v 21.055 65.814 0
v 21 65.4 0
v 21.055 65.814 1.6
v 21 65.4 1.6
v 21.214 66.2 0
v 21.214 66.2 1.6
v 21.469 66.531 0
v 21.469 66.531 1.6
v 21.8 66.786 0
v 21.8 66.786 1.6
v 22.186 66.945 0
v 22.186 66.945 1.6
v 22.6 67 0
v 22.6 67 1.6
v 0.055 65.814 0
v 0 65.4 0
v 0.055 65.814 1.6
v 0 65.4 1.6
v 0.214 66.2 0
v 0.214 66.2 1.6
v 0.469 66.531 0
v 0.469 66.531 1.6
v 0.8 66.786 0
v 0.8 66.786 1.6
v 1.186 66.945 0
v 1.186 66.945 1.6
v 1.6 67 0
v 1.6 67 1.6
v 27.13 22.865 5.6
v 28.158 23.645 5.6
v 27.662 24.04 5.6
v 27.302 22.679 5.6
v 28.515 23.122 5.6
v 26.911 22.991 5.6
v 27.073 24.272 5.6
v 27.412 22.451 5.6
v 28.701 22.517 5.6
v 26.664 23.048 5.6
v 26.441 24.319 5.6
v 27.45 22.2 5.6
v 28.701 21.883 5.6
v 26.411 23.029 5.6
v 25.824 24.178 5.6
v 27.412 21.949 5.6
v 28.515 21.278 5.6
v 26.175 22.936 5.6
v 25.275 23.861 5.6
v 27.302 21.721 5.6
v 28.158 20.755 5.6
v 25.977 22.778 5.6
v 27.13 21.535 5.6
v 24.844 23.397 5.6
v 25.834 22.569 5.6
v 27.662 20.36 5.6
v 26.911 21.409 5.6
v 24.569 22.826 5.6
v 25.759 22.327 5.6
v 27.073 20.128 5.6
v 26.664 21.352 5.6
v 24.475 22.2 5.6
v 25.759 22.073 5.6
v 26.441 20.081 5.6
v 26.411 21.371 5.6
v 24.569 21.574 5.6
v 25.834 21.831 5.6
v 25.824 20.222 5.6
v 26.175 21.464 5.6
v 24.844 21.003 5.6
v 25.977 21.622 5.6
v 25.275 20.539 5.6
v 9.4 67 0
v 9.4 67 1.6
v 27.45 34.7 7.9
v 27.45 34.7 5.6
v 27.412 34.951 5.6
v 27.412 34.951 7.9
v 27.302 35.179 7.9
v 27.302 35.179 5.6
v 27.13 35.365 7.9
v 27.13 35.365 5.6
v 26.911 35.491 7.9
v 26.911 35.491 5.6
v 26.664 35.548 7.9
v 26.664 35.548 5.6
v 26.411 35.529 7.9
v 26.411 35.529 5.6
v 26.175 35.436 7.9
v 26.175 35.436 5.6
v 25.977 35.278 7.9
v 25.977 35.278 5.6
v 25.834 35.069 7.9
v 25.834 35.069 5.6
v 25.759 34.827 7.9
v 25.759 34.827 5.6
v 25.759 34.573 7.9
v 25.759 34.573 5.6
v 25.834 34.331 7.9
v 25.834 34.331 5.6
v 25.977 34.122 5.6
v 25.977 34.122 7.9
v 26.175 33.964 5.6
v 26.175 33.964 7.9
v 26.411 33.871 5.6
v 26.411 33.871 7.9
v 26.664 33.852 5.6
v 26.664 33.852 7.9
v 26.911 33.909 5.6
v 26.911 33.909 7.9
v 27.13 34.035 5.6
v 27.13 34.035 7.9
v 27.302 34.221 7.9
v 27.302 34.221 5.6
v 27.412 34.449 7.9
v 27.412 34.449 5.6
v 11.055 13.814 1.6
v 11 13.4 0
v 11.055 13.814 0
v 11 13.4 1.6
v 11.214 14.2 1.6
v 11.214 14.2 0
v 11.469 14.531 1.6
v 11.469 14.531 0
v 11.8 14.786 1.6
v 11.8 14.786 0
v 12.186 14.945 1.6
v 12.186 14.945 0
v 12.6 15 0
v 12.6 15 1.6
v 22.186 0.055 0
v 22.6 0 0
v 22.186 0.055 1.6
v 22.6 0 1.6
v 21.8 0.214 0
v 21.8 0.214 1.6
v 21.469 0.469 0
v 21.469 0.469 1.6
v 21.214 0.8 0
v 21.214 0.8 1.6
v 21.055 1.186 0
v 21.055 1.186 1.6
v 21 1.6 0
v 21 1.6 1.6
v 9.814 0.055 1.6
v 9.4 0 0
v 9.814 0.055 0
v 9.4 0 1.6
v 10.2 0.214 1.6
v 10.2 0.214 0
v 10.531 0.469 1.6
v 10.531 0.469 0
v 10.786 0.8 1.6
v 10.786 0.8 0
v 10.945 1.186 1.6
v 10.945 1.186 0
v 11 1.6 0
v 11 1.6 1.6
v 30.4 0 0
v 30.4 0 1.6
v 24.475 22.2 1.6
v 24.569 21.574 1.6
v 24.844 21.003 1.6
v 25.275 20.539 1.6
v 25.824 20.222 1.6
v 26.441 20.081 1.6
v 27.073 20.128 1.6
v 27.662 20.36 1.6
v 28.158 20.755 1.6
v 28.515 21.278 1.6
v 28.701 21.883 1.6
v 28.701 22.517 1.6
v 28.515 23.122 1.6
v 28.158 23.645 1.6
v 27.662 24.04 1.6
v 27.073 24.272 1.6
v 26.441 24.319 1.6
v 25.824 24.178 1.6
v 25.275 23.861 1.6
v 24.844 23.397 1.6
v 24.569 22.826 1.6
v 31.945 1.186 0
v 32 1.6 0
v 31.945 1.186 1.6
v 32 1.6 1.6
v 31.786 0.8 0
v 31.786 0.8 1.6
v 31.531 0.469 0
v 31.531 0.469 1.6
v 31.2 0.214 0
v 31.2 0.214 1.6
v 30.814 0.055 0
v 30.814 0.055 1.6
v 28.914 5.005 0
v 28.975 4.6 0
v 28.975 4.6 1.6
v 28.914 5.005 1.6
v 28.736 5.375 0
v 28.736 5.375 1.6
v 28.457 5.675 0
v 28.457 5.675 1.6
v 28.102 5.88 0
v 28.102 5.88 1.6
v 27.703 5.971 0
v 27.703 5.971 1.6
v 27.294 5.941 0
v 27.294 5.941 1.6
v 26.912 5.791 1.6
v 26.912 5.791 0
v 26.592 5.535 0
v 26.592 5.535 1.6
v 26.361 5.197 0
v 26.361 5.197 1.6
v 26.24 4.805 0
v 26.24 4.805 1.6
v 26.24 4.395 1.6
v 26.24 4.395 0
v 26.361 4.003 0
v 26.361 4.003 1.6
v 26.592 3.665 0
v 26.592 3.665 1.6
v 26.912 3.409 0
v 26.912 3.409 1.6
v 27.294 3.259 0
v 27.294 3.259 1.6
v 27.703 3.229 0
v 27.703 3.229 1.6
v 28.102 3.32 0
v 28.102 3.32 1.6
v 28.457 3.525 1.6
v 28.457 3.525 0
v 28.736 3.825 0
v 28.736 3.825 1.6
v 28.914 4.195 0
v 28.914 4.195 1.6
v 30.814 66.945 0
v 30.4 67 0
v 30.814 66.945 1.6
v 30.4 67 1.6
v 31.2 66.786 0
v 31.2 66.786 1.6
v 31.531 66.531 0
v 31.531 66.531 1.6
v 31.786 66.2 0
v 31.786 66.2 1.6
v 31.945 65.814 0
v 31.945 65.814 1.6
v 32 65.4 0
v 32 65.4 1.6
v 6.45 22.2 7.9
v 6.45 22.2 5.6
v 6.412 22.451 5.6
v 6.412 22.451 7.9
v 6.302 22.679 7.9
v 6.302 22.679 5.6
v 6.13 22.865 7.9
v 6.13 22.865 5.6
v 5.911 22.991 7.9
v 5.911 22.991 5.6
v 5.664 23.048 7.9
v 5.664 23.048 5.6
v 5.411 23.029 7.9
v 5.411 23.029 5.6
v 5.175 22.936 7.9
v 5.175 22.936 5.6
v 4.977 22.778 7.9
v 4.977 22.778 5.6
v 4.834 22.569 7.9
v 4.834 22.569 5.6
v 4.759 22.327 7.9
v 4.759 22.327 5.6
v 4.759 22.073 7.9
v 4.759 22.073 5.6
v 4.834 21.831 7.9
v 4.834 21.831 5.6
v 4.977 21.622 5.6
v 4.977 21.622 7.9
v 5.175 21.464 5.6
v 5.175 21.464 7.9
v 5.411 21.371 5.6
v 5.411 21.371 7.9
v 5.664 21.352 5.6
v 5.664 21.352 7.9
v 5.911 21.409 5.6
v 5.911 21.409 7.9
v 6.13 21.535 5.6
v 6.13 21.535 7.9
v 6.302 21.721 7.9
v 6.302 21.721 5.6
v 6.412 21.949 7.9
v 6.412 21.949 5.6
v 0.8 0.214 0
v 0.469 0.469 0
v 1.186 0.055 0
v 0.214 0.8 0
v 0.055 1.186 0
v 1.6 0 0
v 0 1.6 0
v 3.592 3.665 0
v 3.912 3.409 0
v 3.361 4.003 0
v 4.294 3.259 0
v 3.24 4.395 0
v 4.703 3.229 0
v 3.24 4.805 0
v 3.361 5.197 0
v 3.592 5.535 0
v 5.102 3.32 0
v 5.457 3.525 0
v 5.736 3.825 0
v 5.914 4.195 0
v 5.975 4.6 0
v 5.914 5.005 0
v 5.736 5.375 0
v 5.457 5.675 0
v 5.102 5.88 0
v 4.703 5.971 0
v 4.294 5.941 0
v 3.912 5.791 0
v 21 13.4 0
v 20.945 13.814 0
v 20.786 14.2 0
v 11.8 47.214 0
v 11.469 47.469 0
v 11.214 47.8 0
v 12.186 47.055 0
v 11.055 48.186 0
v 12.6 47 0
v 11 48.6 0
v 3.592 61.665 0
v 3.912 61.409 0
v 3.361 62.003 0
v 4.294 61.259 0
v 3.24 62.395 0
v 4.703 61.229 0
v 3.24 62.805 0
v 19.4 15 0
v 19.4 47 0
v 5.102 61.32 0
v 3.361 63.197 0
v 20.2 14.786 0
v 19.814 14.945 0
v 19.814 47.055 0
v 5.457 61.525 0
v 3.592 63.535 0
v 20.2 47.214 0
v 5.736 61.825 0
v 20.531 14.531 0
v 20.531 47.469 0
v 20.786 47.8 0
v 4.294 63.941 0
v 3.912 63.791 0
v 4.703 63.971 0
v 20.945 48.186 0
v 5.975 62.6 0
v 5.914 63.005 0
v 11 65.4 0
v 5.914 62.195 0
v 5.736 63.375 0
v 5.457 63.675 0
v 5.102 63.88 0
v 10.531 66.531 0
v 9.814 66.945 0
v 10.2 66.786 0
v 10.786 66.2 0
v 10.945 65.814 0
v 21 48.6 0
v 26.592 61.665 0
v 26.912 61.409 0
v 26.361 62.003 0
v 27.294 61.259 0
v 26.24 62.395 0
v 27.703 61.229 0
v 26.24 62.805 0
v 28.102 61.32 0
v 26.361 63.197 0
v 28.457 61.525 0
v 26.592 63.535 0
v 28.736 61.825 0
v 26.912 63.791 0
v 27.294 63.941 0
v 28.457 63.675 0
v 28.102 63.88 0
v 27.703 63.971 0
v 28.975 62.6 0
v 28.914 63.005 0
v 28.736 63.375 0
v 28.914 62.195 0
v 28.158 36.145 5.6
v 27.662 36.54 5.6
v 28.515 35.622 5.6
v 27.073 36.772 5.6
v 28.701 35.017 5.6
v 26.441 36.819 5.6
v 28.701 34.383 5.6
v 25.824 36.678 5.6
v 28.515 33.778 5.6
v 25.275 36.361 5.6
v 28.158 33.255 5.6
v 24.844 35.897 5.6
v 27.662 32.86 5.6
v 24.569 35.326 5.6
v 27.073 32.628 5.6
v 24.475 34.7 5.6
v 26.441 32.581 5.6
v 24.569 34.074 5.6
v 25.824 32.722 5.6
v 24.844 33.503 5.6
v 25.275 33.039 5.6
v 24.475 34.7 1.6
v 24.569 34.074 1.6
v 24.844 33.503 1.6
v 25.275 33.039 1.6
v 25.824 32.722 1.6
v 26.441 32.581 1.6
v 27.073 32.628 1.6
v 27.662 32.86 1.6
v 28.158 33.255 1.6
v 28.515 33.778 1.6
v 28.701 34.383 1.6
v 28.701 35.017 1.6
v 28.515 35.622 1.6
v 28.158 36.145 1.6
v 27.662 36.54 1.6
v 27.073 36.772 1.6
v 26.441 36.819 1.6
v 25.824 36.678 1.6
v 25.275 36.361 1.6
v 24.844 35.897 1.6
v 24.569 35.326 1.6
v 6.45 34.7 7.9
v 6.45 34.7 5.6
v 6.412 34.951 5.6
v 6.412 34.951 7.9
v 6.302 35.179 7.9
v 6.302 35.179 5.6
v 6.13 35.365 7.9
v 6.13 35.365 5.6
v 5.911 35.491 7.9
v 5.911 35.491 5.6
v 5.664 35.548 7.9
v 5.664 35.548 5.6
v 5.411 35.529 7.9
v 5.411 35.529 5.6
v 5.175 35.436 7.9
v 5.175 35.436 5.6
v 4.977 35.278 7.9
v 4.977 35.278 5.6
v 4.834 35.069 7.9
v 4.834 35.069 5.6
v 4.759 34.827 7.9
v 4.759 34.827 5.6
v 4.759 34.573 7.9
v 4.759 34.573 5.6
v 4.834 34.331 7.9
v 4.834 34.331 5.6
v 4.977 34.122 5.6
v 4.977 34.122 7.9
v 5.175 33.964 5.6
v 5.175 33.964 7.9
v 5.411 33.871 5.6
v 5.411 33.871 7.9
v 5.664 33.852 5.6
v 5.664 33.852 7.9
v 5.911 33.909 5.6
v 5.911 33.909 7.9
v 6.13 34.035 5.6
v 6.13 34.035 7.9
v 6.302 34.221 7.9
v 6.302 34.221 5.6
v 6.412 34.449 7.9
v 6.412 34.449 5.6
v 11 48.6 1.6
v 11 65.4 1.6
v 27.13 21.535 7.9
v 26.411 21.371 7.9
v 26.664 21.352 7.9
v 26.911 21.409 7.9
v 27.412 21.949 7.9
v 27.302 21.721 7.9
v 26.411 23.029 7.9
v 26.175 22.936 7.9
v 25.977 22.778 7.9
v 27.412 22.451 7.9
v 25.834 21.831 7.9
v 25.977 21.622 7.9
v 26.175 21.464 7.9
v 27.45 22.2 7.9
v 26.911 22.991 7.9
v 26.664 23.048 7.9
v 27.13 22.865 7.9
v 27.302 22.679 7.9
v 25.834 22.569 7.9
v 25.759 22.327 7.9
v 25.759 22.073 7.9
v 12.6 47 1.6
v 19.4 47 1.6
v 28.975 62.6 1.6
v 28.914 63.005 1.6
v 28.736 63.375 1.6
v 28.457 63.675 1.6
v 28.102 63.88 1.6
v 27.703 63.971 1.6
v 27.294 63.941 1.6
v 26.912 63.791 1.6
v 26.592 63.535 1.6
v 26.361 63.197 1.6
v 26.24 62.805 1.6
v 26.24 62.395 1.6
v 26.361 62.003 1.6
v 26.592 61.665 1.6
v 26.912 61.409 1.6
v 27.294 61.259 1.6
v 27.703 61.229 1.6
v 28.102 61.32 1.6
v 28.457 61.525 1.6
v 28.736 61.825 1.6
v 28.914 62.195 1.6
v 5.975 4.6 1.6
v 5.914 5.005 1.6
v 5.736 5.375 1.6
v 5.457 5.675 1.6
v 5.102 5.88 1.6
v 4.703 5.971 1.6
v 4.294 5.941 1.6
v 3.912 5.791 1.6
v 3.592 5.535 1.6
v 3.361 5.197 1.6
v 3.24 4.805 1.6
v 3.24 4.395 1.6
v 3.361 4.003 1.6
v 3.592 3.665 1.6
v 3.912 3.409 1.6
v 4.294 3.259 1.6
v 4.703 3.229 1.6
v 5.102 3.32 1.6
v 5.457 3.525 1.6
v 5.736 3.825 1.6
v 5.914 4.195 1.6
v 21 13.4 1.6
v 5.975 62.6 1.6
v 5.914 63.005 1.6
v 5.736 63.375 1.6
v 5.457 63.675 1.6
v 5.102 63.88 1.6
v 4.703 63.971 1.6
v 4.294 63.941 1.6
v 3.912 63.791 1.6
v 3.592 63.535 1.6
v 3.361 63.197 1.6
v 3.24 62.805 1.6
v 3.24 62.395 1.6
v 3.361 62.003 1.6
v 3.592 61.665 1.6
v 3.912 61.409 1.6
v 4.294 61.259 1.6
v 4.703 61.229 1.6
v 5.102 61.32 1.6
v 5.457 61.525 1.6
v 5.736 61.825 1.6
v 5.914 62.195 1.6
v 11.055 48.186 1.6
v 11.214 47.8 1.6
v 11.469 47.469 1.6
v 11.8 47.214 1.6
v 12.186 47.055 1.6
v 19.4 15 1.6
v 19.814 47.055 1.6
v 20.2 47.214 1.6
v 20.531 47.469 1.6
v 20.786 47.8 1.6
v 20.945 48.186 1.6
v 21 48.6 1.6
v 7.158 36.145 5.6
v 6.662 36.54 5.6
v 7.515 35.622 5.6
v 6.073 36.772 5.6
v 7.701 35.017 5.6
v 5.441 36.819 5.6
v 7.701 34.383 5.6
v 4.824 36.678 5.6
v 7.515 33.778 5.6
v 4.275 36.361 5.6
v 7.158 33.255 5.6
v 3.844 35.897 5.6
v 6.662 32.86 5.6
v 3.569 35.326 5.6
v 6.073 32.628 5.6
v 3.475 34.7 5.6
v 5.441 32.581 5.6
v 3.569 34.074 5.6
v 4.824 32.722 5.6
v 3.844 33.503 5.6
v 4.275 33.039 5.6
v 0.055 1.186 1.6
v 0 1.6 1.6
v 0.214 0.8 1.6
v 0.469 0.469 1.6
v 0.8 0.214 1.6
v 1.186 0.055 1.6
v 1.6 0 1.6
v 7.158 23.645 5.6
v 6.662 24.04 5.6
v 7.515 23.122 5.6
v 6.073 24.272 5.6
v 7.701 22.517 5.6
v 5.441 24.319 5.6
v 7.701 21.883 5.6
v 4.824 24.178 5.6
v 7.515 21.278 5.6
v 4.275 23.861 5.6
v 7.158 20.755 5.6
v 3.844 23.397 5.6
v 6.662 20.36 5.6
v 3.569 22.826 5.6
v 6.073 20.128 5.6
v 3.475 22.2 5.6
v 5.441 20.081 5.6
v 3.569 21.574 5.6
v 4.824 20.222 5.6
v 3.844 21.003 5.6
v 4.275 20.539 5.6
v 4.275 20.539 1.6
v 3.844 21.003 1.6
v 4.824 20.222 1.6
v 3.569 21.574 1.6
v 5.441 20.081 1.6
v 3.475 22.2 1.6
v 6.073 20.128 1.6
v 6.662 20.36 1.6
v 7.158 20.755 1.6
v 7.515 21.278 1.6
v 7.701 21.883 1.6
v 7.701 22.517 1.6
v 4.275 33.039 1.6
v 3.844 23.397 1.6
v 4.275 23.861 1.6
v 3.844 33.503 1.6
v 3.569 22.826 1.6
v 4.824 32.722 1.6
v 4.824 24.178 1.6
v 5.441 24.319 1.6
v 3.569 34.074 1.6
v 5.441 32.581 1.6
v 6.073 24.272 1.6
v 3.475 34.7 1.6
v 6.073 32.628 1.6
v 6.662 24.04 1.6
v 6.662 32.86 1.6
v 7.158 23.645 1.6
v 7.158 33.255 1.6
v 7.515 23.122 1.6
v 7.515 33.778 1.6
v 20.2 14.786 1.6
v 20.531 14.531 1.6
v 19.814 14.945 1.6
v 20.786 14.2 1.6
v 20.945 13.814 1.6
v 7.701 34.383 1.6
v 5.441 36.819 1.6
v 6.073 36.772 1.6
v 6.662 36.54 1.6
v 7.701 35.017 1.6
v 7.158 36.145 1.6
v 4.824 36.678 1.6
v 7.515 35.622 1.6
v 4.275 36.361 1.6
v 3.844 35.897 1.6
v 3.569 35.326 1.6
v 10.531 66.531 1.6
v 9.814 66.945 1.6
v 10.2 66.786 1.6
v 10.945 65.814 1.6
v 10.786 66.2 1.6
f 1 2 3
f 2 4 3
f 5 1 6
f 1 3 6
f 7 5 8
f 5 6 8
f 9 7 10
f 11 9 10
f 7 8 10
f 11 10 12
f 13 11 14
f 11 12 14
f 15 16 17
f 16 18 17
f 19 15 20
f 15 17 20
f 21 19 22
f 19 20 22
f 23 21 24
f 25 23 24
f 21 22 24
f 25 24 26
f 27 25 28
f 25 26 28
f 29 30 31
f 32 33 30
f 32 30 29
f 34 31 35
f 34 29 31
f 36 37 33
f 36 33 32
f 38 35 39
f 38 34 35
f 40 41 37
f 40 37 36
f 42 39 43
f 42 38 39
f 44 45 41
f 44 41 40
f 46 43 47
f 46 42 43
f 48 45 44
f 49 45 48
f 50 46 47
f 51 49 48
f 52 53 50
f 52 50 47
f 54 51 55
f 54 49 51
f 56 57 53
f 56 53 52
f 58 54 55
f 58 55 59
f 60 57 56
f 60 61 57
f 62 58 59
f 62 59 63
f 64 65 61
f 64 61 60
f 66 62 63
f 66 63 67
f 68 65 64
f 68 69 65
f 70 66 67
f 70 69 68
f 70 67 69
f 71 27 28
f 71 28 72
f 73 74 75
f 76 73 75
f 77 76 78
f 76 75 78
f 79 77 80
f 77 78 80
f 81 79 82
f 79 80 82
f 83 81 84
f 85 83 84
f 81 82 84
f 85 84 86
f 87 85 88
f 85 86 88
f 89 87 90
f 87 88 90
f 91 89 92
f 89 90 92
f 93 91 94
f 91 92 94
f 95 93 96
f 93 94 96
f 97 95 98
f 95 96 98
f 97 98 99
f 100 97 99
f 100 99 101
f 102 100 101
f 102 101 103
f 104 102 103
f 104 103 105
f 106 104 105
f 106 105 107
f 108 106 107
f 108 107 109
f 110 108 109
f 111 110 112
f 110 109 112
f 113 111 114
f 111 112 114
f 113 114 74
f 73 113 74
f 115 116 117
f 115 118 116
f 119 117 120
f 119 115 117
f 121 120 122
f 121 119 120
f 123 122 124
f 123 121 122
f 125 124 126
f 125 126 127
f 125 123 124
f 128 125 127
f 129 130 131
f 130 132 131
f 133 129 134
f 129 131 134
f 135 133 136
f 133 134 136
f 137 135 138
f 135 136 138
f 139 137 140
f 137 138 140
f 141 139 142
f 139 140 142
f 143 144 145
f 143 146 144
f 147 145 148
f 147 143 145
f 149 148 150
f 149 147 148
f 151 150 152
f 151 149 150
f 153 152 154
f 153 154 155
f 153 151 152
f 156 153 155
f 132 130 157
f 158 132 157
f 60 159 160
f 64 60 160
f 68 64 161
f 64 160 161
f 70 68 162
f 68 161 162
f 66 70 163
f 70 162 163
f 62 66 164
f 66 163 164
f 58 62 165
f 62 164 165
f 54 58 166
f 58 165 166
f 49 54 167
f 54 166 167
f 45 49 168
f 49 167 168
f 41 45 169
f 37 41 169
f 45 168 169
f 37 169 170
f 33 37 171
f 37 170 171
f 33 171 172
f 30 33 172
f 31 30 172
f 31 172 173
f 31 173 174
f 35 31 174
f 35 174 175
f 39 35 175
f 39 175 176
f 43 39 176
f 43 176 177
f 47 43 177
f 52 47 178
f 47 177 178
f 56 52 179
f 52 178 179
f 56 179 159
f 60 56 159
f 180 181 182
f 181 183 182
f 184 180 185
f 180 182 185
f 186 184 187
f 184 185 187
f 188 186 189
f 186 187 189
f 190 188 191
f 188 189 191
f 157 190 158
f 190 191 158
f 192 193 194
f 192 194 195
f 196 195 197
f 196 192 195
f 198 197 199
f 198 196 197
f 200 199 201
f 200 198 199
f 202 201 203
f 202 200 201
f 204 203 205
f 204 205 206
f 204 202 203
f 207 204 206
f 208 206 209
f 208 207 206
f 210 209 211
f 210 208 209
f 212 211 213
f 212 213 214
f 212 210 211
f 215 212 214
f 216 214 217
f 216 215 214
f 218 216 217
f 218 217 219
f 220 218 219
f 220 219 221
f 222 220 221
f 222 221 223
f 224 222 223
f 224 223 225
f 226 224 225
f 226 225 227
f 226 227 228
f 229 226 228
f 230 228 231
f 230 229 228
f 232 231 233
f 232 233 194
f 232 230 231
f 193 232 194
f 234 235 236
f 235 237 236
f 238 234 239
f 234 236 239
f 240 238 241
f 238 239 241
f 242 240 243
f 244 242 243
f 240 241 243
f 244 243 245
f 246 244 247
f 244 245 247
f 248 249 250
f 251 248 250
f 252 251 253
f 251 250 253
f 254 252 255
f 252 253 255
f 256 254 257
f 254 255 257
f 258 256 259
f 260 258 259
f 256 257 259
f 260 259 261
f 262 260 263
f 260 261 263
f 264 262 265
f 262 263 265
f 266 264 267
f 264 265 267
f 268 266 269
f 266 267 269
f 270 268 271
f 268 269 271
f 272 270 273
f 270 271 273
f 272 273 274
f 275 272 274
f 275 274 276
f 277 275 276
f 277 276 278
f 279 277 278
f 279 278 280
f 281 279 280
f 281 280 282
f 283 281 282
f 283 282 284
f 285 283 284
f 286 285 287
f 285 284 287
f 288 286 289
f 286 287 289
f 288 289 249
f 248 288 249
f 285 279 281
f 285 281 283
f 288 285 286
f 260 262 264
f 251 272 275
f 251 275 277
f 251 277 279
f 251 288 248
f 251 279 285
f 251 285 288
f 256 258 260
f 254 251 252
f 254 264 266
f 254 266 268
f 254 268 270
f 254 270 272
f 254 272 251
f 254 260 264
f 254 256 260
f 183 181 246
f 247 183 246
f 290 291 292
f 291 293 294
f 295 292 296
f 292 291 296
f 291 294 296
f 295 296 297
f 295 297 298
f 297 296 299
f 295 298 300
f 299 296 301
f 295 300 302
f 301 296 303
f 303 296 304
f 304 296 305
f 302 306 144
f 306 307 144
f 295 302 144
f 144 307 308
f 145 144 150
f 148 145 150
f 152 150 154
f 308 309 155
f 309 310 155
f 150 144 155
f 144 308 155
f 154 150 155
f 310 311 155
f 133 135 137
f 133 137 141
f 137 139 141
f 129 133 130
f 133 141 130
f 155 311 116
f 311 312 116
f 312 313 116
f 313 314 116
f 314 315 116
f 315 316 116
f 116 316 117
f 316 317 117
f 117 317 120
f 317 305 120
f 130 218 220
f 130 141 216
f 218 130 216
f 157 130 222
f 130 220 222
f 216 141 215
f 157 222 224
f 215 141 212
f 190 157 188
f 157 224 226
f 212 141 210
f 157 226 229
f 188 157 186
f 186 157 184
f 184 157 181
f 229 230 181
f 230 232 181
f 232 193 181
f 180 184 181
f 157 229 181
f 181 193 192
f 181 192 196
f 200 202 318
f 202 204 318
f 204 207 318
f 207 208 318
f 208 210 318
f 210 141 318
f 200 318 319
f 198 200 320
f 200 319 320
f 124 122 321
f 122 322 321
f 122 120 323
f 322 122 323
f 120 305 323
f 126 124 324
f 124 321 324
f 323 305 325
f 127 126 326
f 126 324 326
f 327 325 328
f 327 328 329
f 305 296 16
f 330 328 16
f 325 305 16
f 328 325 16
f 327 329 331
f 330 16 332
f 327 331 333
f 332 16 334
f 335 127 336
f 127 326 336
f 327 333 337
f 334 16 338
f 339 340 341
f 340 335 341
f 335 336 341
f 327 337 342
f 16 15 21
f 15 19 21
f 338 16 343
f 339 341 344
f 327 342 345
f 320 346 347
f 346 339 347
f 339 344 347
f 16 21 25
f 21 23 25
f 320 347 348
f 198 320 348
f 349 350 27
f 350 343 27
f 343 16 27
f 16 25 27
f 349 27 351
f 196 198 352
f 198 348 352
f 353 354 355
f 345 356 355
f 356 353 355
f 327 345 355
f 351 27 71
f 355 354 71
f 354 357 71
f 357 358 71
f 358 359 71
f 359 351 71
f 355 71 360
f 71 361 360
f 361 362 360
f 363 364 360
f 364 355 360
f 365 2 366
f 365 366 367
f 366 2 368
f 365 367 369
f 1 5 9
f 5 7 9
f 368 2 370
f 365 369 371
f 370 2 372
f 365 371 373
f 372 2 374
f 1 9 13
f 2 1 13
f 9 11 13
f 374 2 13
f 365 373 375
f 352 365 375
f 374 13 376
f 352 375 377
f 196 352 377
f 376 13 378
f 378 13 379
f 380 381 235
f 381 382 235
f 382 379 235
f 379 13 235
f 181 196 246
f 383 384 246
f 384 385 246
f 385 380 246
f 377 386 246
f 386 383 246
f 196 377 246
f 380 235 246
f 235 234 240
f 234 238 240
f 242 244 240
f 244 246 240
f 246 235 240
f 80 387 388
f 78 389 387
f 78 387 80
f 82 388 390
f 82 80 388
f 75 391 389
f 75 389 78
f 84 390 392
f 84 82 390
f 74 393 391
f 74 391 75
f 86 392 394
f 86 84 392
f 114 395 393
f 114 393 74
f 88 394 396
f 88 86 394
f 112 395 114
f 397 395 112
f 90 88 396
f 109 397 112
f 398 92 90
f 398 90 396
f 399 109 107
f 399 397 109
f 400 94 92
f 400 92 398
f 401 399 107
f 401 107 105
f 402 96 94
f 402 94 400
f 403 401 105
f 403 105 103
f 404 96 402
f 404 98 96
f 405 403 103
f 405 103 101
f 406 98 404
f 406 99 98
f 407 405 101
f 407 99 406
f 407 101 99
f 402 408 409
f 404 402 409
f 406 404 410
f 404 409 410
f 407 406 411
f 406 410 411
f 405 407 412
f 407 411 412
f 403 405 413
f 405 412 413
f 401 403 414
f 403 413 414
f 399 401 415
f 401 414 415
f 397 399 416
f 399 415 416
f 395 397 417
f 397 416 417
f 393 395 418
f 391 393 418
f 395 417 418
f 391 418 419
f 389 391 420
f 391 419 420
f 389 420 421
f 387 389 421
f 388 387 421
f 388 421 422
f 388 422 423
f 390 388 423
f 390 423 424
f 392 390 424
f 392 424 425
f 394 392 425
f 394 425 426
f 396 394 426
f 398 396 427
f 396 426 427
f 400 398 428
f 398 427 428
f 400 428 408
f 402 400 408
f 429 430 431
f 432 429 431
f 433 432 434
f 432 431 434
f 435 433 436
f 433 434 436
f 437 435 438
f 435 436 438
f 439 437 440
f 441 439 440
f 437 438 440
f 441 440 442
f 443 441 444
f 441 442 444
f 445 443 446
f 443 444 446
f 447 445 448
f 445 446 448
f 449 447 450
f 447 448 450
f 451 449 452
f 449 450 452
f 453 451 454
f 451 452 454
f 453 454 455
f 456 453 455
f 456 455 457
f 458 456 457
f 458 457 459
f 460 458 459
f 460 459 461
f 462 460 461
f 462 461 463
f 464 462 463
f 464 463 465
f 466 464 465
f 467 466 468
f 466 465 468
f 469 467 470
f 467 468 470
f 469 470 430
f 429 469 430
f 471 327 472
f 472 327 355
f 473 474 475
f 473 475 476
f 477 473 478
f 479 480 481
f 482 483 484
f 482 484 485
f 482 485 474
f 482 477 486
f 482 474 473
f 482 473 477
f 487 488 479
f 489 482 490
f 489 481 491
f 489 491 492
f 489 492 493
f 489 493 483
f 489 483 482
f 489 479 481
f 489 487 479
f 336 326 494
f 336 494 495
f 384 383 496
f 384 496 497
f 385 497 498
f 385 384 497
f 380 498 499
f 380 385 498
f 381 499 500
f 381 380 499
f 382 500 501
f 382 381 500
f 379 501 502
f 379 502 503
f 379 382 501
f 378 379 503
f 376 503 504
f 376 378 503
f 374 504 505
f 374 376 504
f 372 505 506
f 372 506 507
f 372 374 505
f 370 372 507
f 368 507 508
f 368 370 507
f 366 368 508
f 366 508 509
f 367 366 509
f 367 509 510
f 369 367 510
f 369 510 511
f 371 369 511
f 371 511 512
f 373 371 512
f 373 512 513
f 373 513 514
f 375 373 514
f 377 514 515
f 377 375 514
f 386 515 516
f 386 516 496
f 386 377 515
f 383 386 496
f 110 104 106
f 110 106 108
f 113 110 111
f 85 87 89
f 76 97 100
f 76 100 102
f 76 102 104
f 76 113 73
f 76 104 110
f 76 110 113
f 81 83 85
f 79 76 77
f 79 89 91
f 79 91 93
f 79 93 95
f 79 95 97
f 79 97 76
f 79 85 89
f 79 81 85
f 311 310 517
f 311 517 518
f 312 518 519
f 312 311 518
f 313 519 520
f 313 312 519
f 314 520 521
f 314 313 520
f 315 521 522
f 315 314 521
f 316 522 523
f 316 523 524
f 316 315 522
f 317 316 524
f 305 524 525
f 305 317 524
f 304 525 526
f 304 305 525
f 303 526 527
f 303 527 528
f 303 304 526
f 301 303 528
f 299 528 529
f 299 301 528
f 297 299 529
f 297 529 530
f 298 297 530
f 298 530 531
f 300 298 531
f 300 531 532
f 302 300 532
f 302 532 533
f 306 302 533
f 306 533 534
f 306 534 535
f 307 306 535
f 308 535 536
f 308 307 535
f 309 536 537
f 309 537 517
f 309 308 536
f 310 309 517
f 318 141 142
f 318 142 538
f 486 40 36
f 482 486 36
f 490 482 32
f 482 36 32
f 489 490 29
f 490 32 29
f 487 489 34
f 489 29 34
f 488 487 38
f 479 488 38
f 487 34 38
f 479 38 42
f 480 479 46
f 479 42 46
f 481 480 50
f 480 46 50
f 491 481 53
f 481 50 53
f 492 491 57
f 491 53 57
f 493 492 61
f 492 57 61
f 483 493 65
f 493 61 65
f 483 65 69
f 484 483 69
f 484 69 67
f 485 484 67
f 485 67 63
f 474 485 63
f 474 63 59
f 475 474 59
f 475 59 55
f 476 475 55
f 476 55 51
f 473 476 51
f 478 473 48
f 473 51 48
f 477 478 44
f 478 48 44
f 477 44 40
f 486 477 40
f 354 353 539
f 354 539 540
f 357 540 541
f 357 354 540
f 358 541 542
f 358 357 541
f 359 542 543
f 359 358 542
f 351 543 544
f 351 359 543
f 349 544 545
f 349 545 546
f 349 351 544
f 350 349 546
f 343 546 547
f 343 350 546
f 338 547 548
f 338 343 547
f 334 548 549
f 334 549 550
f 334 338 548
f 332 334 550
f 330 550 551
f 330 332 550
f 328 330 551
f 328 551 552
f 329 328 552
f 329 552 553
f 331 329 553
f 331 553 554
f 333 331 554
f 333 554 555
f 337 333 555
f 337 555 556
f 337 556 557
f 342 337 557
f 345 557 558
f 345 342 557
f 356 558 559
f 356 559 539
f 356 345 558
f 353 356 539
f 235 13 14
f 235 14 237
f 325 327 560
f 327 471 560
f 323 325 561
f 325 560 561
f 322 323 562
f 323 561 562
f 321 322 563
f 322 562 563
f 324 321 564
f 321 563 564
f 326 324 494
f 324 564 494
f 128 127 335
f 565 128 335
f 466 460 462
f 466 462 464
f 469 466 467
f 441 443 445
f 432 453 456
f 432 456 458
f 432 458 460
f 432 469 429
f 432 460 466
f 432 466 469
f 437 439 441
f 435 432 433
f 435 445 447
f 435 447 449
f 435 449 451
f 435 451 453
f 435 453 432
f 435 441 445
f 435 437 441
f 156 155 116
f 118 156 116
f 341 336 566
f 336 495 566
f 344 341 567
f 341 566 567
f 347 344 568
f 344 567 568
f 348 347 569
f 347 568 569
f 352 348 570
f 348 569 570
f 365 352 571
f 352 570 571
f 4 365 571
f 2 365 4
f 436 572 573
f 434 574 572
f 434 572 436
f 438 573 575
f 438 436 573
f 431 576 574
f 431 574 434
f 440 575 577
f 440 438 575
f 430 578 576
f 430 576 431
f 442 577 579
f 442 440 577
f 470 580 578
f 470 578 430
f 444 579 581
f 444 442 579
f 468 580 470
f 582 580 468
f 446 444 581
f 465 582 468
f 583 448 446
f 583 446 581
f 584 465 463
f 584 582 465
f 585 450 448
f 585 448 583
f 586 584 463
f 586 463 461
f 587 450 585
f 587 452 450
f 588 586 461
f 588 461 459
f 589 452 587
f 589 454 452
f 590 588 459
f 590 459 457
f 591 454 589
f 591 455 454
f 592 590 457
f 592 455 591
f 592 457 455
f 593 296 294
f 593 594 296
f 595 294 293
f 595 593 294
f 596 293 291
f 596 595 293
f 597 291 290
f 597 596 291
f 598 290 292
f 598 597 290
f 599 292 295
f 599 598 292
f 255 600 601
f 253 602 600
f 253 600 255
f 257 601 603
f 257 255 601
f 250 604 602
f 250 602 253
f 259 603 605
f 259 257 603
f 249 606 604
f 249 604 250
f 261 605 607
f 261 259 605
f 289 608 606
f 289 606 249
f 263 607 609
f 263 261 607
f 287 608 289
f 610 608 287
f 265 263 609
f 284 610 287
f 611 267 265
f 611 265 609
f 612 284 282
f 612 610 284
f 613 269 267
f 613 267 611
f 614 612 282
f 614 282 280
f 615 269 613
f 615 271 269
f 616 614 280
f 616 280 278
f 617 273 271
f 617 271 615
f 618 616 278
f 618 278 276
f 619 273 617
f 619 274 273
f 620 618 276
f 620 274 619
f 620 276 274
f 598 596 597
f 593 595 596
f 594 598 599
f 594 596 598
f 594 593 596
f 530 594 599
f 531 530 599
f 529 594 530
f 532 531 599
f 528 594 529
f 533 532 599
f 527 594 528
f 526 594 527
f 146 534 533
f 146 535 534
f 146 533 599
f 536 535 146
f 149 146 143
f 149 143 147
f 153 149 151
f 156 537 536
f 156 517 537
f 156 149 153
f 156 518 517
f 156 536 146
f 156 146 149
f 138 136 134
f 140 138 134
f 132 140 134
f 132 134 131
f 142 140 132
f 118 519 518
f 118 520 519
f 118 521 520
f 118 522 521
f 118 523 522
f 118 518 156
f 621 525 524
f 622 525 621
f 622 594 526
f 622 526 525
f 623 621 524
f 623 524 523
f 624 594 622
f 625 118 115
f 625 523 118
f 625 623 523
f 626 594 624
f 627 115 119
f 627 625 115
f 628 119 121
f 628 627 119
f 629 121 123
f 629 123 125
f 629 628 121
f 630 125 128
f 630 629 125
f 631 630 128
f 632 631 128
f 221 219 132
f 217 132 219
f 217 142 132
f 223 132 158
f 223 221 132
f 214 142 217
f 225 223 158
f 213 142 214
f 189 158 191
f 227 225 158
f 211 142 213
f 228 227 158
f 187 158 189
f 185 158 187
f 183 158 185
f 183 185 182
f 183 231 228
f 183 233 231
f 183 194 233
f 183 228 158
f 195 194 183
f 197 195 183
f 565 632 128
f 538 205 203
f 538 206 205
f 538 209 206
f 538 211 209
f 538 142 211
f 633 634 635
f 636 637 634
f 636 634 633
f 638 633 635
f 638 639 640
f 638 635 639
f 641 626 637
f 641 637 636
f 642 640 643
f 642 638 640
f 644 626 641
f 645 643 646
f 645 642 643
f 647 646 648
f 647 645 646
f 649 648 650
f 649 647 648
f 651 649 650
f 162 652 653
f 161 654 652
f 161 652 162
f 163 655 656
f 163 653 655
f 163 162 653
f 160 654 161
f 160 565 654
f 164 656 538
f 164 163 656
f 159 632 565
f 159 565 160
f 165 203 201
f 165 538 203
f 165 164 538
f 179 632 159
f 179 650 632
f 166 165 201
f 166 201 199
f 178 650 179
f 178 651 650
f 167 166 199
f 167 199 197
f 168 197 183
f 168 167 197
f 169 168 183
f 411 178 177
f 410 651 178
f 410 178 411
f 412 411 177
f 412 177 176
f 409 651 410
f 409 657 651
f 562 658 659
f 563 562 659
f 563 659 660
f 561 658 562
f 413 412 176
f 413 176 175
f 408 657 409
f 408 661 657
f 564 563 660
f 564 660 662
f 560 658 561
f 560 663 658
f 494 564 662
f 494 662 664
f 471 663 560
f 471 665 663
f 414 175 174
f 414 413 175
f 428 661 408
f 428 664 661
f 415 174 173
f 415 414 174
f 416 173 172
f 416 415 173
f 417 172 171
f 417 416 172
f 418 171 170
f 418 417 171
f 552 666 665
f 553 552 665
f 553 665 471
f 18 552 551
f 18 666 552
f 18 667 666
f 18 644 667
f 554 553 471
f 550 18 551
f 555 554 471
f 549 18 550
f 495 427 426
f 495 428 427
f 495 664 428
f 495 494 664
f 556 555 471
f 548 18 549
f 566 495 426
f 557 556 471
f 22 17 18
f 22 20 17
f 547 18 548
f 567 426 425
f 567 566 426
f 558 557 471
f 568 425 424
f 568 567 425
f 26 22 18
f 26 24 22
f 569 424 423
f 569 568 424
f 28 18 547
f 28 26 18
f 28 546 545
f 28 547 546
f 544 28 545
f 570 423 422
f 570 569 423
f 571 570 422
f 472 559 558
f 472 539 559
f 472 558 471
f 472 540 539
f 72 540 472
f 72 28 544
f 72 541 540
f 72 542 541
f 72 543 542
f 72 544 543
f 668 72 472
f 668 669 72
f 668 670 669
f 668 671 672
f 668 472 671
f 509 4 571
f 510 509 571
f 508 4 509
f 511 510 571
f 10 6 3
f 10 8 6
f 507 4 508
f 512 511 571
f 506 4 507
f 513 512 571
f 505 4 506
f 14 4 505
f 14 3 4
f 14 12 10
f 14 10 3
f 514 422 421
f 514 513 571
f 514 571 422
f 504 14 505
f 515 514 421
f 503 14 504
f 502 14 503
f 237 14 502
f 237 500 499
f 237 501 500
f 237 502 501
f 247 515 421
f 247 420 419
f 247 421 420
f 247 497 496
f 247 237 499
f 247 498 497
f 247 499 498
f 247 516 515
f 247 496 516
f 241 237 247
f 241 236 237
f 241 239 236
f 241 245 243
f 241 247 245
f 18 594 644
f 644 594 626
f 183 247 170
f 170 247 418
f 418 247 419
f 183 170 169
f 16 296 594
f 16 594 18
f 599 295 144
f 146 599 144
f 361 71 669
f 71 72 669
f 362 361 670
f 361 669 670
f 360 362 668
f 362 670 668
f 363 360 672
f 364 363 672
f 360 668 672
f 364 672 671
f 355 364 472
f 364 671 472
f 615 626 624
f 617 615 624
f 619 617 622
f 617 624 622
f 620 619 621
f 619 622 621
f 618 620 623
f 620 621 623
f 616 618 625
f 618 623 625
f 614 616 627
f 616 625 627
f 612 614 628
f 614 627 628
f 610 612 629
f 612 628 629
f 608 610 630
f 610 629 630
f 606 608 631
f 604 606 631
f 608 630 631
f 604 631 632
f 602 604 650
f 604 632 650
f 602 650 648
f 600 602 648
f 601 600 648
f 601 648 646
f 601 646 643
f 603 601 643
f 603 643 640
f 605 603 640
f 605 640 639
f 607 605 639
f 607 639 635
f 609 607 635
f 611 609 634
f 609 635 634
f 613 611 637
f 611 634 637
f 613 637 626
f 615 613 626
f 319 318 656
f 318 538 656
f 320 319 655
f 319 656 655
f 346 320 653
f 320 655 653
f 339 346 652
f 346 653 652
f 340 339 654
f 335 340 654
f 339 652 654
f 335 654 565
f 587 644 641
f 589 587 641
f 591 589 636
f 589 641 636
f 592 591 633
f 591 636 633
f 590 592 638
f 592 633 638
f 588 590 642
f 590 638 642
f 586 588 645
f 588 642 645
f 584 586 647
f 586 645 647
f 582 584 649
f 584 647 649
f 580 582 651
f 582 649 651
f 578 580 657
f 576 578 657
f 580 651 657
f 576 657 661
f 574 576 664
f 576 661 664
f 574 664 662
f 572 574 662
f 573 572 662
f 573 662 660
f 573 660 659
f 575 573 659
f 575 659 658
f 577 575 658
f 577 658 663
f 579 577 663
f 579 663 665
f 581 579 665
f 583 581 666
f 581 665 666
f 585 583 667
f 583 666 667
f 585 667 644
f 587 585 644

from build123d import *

# Parameters (mm, degrees)
SZKIC2_W                        = 32
SZKIC2_H                        = 67
SZKIC2_R                        = 1.375001118
SZKIC2_R_2                      = 1.375002453
SZKIC2_R_3                      = 1.374998979
SZKIC2_R_4                      = 1.375001969
DODANIE_WYCI_GNI_CIE1_DEPTH     = 1.6
SZKIC3_R                        = 2.125002003
SZKIC3_R_2                      = 2.125000412
SZKIC3_R_3                      = 2.124999361
SZKIC3_R_4                      = 2.125
DODANIE_WYCI_GNI_CIE2_DEPTH     = 4
SZKIC4_R                        = 0.85
DODANIE_WYCI_GNI_CIE3_DEPTH     = 2.3
WYTNIJ_WYCI_GNI_CIE1_DEPTH      = 75.51637404
WYTNIJ_WYCI_GNI_CIE1_DEPTH_BACK = 75.51637404
SZKIC5_W                        = 10
SZKIC5_H                        = 20
SZKIC5_H_2                      = 15
ZAOKR_GLENIE1_R                 = 1.6


with BuildPart() as part:
    # Szkic2 → Dodanie-wyciągnięcie1 (new body)
    with BuildSketch(Plane.XY):
        with Locations((16, 33.5)):
            Rectangle(SZKIC2_W, SZKIC2_H)
        with Locations((4.60000054, 4.59999621)):
            Circle(SZKIC2_R, mode=Mode.SUBTRACT)
        with Locations((27.599994617, 4.599998848)):
            Circle(SZKIC2_R_2, mode=Mode.SUBTRACT)
        with Locations((27.599997676, 62.599998714)):
            Circle(SZKIC2_R_3, mode=Mode.SUBTRACT)
        with Locations((4.599996565, 62.599994963)):
            Circle(SZKIC2_R_4, mode=Mode.SUBTRACT)
    extrude(amount=DODANIE_WYCI_GNI_CIE1_DEPTH)

    # Szkic3 → Dodanie-wyciągnięcie2 (add)
    with BuildSketch(Plane.XY.offset(1.6)):
        with Locations(Location((5.599998705, 34.699994945, 0), (0, 0, 180))):
            Circle(SZKIC3_R)
        with Locations(Location((26.599994052, 34.699996536, 0), (0, 0, 180))):
            Circle(SZKIC3_R_2)
        with Locations(Location((5.599997835, 22.199997588, 0), (0, 0, 180))):
            Circle(SZKIC3_R_3)
        with Locations(Location((26.599996674, 22.199996948, 0), (0, 0, 180))):
            Circle(SZKIC3_R_4)
    extrude(amount=DODANIE_WYCI_GNI_CIE2_DEPTH)

    # Szkic4 → Dodanie-wyciągnięcie3 (add)
    with BuildSketch(Plane.XY.offset(5.6)):
        with Locations((5.599998705, 34.699994945)):
            Circle(SZKIC4_R)
        with Locations((26.599994052, 34.699996536)):
            Circle(SZKIC4_R)
        with Locations((5.599997835, 22.199997588)):
            Circle(SZKIC4_R)
        with Locations((26.599996674, 22.199996948)):
            Circle(SZKIC4_R)
    extrude(amount=DODANIE_WYCI_GNI_CIE3_DEPTH)

    # Szkic5 → Wytnij-wyciągnięcie1 (cut, two sides: drawn at the far end of the back side and taken through both)
    with BuildSketch(Plane.XY.offset(1.6).offset(-WYTNIJ_WYCI_GNI_CIE1_DEPTH_BACK)):
        with Locations((16, 57)):
            Rectangle(SZKIC5_W, SZKIC5_H)
        with Locations((16, 7.5)):
            Rectangle(SZKIC5_W, SZKIC5_H_2)
    extrude(amount=WYTNIJ_WYCI_GNI_CIE1_DEPTH + WYTNIJ_WYCI_GNI_CIE1_DEPTH_BACK, mode=Mode.SUBTRACT)

    # Zaokrąglenie1
    zaokr_glenie1_edges = [part.edges().sort_by_distance(p)[0] for p in [
        (0, 67, 0.8),
        (21, 0, 0.8),
        (11, 15, 0.8),
        (32, 67, 0.8),
        (11, 0, 0.8),
        (21, 15, 0.8),
        (32, 0, 0.8),
        (0, 0, 0.8),
        (11, 67, 0.8),
        (21, 47, 0.8),
        (21, 67, 0.8),
        (11, 47, 0.8),
    ]]
    fillet(zaokr_glenie1_edges, radius=ZAOKR_GLENIE1_R)


solid = part.part
